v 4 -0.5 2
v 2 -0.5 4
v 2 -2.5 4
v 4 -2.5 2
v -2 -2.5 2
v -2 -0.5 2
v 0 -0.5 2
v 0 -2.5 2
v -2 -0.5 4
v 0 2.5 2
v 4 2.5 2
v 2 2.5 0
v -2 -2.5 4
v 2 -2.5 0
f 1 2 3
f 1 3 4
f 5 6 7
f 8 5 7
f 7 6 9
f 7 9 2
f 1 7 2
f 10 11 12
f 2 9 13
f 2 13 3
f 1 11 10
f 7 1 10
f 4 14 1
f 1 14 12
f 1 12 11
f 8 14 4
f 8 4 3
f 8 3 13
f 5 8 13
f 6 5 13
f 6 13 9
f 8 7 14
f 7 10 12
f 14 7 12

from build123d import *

# Parameters (mm, degrees)
SKETCH1_W           = 4
SKETCH1_H           = 5
BOSS_EXTRUDE1_DEPTH = 2
SKETCH2_W           = 4
SKETCH2_H           = 2
BOSS_EXTRUDE2_DEPTH = 2
BOSS_EXTRUDE3_DEPTH = 2
BOSS_EXTRUDE4_DEPTH = 5
CUT_EXTRUDE1_DEPTH  = 5


with BuildPart() as part:
    # Sketch1 → Boss-Extrude1 (new body)
    with BuildSketch(Plane.XY):
        Rectangle(SKETCH1_W, SKETCH1_H)
    extrude(amount=BOSS_EXTRUDE1_DEPTH)

    # Sketch2 → Boss-Extrude2 (add)
    with BuildSketch(Plane.XY.offset(2)):
        with Locations((0, -1.5)):
            Rectangle(SKETCH2_W, SKETCH2_H)
    extrude(amount=BOSS_EXTRUDE2_DEPTH)

    # Sketch3 → Boss-Extrude3 (add)
    with BuildSketch(Plane(origin=(0, -0.5, 0), x_dir=(1, 0, 0), z_dir=(0, 1, 0))):
        Polygon((2, -4), (4, -2), (2, -2), align=None)
    extrude(amount=-BOSS_EXTRUDE3_DEPTH)

    # Sketch4 → Boss-Extrude4 (add)
    with BuildSketch(Plane(origin=(0, 2.5, 0), x_dir=(1, 0, 0), z_dir=(0, 1, 0))):
        Polygon((2, 0), (4, -2), (1.353311903, -2), align=None)
    extrude(amount=-BOSS_EXTRUDE4_DEPTH)

    # Sketch5 → Cut-Extrude1 (cut)
    with BuildSketch(Plane(origin=(0, 2.5, 0), x_dir=(1, 0, 0), z_dir=(0, 1, 0))):
        Polygon((-2, -2), (0, -2), (2, 0), (-2, 0), align=None)
    extrude(amount=-CUT_EXTRUDE1_DEPTH, mode=Mode.SUBTRACT)


solid = part.part
